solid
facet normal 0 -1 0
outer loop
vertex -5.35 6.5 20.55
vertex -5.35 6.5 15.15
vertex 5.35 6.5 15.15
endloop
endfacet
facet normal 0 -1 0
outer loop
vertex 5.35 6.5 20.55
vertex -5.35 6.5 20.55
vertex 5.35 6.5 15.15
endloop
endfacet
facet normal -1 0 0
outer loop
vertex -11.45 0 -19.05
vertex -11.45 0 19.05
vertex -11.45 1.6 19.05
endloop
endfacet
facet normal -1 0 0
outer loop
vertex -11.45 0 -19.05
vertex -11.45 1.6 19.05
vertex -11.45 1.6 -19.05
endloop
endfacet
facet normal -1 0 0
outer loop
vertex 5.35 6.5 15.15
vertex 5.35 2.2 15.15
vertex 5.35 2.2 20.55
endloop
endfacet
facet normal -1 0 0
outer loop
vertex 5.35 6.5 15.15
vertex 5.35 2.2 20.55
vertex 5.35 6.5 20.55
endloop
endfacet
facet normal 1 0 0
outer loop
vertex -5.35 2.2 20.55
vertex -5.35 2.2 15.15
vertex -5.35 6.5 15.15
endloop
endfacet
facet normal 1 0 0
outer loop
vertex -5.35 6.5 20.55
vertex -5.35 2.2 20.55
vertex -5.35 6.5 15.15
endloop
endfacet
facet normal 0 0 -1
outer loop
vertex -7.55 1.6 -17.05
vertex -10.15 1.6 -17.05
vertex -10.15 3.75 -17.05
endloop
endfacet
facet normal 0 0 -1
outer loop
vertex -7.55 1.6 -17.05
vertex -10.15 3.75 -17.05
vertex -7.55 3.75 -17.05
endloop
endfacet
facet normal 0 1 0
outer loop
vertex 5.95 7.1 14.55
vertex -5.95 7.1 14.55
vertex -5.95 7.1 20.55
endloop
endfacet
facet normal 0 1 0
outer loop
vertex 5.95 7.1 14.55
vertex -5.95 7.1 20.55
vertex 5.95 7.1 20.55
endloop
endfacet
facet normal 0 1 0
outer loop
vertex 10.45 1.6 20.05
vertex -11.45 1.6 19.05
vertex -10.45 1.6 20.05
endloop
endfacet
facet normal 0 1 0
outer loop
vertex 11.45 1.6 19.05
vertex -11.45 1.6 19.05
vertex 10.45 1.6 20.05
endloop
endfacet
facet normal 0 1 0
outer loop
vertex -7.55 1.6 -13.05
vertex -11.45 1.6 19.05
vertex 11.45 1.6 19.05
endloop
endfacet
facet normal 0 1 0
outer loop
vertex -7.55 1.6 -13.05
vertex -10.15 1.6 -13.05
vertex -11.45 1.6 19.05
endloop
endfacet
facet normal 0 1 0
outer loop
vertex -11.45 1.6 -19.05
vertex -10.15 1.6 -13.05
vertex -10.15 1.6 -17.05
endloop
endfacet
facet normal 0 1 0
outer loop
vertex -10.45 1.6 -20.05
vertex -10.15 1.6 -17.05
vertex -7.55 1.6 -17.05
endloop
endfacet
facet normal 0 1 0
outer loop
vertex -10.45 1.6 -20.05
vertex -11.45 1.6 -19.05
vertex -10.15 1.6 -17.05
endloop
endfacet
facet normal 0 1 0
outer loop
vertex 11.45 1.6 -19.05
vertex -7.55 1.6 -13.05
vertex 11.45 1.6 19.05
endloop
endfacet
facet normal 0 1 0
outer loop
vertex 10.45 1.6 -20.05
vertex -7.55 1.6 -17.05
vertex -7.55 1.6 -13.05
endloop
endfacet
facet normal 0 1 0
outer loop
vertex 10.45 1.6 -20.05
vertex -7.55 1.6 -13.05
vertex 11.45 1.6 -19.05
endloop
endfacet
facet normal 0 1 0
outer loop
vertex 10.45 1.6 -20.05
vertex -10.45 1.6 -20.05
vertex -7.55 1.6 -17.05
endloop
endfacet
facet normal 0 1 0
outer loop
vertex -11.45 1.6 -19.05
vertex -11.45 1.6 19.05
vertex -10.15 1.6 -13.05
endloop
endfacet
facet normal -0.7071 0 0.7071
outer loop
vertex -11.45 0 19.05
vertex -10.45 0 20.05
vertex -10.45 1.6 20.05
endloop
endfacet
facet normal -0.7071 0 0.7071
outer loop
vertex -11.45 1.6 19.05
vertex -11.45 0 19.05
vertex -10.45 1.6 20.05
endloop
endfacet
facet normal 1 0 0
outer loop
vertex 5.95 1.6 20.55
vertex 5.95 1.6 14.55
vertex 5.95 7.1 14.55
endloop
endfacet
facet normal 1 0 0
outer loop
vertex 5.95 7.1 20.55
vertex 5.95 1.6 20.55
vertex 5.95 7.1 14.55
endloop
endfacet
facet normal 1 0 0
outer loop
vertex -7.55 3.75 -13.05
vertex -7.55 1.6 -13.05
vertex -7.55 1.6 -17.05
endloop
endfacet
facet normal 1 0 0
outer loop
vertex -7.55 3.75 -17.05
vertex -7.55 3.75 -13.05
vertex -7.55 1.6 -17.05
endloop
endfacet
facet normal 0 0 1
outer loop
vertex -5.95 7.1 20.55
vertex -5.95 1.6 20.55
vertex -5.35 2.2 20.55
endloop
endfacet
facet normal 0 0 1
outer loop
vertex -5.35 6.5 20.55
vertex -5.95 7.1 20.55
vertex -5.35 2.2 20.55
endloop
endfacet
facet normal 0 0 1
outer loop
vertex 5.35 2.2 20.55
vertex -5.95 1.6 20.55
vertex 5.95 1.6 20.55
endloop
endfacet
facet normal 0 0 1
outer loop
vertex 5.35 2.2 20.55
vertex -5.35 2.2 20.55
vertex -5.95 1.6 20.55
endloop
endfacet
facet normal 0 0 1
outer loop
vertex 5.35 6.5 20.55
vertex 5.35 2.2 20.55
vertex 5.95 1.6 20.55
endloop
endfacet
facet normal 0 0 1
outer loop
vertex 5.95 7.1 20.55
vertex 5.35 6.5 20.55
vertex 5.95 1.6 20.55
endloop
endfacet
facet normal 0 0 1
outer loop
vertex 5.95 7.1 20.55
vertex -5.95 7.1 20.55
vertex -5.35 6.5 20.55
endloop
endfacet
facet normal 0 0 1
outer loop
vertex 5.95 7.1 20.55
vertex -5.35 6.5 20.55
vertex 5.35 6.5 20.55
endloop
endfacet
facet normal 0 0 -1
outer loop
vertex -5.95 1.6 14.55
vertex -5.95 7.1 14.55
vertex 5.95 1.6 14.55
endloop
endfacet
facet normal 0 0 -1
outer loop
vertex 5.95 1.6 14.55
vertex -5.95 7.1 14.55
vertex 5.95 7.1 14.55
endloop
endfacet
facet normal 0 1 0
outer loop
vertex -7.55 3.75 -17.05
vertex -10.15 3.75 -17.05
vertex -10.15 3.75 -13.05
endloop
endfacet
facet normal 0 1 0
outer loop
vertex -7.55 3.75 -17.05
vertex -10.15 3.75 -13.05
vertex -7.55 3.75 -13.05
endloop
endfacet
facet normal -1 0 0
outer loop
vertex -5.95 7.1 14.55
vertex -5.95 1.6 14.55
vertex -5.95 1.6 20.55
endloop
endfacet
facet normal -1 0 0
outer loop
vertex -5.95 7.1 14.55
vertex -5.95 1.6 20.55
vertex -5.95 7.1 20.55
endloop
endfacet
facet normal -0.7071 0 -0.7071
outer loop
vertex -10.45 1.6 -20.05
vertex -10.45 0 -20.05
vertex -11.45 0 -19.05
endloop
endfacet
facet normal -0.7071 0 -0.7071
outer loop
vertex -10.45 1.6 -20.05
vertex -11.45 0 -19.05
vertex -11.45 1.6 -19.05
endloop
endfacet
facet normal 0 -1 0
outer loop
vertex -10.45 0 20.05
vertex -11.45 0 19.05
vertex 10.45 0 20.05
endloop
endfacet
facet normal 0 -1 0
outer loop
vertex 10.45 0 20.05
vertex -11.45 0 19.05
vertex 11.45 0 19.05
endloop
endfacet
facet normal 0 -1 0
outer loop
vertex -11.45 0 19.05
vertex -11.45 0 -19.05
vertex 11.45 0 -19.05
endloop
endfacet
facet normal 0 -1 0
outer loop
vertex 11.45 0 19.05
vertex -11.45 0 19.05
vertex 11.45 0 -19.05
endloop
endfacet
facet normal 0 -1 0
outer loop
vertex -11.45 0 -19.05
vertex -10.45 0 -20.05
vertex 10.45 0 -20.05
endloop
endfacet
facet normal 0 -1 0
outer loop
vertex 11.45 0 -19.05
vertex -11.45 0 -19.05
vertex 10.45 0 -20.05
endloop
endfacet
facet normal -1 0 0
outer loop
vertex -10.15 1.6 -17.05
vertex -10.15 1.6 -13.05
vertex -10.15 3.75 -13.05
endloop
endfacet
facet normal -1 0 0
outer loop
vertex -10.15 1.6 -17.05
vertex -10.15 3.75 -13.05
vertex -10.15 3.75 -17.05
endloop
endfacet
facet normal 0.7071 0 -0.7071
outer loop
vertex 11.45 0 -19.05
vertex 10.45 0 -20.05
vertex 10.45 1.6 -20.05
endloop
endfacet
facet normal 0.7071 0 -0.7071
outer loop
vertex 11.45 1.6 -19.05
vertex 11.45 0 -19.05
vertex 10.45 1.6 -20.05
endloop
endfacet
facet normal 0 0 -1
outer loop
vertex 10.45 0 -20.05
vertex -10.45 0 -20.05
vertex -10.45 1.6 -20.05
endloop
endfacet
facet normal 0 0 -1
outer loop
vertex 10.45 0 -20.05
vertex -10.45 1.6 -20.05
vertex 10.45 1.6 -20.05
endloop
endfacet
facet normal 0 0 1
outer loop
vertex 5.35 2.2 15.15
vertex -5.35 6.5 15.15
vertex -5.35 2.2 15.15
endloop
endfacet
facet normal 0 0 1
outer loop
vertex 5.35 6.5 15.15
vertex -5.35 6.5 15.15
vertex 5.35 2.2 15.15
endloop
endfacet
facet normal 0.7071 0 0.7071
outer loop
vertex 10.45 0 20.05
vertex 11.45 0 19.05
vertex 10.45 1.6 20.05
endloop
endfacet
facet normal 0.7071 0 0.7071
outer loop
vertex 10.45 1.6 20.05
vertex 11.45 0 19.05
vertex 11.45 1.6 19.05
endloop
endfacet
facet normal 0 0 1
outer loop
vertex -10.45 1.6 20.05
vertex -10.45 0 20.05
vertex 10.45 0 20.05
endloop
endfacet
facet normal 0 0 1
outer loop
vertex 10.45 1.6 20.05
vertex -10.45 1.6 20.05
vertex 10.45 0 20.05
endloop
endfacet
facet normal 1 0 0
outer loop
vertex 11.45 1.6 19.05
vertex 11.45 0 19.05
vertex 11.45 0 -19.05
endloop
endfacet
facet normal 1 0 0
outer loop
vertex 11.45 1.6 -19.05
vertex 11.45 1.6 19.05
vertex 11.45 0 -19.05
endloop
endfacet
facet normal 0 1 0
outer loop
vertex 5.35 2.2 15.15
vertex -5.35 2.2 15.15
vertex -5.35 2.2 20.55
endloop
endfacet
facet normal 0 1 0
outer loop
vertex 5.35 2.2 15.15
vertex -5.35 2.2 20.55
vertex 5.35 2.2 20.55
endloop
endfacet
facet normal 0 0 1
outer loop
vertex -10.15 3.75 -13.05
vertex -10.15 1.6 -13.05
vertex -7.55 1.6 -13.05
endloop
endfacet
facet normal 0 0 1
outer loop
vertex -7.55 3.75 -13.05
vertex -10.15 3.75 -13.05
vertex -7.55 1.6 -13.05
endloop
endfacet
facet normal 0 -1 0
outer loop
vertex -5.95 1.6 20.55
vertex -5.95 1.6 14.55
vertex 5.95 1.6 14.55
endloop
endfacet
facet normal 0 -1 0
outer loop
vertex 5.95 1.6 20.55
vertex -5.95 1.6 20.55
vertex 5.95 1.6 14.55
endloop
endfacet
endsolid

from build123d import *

# Parameters (mm, degrees)
SKETCH1_W                = 22.9
SKETCH1_H                = 40.1
BOSS_EXTRUDE1_DEPTH      = 1.6
BOSS_EXTRUDE2_DEPTH      = 0.5
BOSS_EXTRUDE2_DEPTH_BACK = 5.5
SKETCH2_W                = 11.9
SKETCH2_H                = 5.5
SHELL1_T                 = -0.6
CHAMFER1_SIZE            = 1
SKETCH3_W                = 2.6
SKETCH3_H                = 4
BOSS_EXTRUDE3_DEPTH      = 2.15


with BuildPart() as part:
    # Sketch1 → Boss-Extrude1 (new body)
    with BuildSketch(Plane(origin=(0, 0, 0), x_dir=(1, 0, 0), z_dir=(0, 1, 0))):
        Rectangle(SKETCH1_W, SKETCH1_H)
    extrude(amount=BOSS_EXTRUDE1_DEPTH)

    # Chamfer1
    chamfer1_edges = [part.edges().sort_by_distance(p)[0] for p in [
        (-11.45, 0.8, -20.05),
        (11.45, 0.8, -20.05),
        (11.45, 0.8, 20.05),
        (-11.45, 0.8, 20.05),
    ]]
    chamfer(chamfer1_edges, length=CHAMFER1_SIZE)

    # Sketch3 → Boss-Extrude3 (add)
    with BuildSketch(Plane(origin=(0, 1.6, 0), x_dir=(1, 0, 0), z_dir=(0, 1, 0))):
        with Locations((-8.85, 15.05)):
            Rectangle(SKETCH3_W, SKETCH3_H)
    extrude(amount=BOSS_EXTRUDE3_DEPTH)


with BuildPart() as body_2:
    # Sketch2 → Boss-Extrude2 (new, two sides: drawn at the far end of the back side and taken through both)
    with BuildSketch(Plane.XY.offset(20.05).offset(-BOSS_EXTRUDE2_DEPTH_BACK)):
        with Locations((0, 4.35)):
            Rectangle(SKETCH2_W, SKETCH2_H)
    extrude(amount=BOSS_EXTRUDE2_DEPTH + BOSS_EXTRUDE2_DEPTH_BACK)

    # Shell1
    shell1_openings = [body_2.faces().sort_by_distance(p)[0] for p in [
        (0, 4.35, 20.55),
    ]]
    offset(amount=SHELL1_T, openings=shell1_openings, kind=Kind.INTERSECTION)


solid = Compound([part.part, body_2.part])
